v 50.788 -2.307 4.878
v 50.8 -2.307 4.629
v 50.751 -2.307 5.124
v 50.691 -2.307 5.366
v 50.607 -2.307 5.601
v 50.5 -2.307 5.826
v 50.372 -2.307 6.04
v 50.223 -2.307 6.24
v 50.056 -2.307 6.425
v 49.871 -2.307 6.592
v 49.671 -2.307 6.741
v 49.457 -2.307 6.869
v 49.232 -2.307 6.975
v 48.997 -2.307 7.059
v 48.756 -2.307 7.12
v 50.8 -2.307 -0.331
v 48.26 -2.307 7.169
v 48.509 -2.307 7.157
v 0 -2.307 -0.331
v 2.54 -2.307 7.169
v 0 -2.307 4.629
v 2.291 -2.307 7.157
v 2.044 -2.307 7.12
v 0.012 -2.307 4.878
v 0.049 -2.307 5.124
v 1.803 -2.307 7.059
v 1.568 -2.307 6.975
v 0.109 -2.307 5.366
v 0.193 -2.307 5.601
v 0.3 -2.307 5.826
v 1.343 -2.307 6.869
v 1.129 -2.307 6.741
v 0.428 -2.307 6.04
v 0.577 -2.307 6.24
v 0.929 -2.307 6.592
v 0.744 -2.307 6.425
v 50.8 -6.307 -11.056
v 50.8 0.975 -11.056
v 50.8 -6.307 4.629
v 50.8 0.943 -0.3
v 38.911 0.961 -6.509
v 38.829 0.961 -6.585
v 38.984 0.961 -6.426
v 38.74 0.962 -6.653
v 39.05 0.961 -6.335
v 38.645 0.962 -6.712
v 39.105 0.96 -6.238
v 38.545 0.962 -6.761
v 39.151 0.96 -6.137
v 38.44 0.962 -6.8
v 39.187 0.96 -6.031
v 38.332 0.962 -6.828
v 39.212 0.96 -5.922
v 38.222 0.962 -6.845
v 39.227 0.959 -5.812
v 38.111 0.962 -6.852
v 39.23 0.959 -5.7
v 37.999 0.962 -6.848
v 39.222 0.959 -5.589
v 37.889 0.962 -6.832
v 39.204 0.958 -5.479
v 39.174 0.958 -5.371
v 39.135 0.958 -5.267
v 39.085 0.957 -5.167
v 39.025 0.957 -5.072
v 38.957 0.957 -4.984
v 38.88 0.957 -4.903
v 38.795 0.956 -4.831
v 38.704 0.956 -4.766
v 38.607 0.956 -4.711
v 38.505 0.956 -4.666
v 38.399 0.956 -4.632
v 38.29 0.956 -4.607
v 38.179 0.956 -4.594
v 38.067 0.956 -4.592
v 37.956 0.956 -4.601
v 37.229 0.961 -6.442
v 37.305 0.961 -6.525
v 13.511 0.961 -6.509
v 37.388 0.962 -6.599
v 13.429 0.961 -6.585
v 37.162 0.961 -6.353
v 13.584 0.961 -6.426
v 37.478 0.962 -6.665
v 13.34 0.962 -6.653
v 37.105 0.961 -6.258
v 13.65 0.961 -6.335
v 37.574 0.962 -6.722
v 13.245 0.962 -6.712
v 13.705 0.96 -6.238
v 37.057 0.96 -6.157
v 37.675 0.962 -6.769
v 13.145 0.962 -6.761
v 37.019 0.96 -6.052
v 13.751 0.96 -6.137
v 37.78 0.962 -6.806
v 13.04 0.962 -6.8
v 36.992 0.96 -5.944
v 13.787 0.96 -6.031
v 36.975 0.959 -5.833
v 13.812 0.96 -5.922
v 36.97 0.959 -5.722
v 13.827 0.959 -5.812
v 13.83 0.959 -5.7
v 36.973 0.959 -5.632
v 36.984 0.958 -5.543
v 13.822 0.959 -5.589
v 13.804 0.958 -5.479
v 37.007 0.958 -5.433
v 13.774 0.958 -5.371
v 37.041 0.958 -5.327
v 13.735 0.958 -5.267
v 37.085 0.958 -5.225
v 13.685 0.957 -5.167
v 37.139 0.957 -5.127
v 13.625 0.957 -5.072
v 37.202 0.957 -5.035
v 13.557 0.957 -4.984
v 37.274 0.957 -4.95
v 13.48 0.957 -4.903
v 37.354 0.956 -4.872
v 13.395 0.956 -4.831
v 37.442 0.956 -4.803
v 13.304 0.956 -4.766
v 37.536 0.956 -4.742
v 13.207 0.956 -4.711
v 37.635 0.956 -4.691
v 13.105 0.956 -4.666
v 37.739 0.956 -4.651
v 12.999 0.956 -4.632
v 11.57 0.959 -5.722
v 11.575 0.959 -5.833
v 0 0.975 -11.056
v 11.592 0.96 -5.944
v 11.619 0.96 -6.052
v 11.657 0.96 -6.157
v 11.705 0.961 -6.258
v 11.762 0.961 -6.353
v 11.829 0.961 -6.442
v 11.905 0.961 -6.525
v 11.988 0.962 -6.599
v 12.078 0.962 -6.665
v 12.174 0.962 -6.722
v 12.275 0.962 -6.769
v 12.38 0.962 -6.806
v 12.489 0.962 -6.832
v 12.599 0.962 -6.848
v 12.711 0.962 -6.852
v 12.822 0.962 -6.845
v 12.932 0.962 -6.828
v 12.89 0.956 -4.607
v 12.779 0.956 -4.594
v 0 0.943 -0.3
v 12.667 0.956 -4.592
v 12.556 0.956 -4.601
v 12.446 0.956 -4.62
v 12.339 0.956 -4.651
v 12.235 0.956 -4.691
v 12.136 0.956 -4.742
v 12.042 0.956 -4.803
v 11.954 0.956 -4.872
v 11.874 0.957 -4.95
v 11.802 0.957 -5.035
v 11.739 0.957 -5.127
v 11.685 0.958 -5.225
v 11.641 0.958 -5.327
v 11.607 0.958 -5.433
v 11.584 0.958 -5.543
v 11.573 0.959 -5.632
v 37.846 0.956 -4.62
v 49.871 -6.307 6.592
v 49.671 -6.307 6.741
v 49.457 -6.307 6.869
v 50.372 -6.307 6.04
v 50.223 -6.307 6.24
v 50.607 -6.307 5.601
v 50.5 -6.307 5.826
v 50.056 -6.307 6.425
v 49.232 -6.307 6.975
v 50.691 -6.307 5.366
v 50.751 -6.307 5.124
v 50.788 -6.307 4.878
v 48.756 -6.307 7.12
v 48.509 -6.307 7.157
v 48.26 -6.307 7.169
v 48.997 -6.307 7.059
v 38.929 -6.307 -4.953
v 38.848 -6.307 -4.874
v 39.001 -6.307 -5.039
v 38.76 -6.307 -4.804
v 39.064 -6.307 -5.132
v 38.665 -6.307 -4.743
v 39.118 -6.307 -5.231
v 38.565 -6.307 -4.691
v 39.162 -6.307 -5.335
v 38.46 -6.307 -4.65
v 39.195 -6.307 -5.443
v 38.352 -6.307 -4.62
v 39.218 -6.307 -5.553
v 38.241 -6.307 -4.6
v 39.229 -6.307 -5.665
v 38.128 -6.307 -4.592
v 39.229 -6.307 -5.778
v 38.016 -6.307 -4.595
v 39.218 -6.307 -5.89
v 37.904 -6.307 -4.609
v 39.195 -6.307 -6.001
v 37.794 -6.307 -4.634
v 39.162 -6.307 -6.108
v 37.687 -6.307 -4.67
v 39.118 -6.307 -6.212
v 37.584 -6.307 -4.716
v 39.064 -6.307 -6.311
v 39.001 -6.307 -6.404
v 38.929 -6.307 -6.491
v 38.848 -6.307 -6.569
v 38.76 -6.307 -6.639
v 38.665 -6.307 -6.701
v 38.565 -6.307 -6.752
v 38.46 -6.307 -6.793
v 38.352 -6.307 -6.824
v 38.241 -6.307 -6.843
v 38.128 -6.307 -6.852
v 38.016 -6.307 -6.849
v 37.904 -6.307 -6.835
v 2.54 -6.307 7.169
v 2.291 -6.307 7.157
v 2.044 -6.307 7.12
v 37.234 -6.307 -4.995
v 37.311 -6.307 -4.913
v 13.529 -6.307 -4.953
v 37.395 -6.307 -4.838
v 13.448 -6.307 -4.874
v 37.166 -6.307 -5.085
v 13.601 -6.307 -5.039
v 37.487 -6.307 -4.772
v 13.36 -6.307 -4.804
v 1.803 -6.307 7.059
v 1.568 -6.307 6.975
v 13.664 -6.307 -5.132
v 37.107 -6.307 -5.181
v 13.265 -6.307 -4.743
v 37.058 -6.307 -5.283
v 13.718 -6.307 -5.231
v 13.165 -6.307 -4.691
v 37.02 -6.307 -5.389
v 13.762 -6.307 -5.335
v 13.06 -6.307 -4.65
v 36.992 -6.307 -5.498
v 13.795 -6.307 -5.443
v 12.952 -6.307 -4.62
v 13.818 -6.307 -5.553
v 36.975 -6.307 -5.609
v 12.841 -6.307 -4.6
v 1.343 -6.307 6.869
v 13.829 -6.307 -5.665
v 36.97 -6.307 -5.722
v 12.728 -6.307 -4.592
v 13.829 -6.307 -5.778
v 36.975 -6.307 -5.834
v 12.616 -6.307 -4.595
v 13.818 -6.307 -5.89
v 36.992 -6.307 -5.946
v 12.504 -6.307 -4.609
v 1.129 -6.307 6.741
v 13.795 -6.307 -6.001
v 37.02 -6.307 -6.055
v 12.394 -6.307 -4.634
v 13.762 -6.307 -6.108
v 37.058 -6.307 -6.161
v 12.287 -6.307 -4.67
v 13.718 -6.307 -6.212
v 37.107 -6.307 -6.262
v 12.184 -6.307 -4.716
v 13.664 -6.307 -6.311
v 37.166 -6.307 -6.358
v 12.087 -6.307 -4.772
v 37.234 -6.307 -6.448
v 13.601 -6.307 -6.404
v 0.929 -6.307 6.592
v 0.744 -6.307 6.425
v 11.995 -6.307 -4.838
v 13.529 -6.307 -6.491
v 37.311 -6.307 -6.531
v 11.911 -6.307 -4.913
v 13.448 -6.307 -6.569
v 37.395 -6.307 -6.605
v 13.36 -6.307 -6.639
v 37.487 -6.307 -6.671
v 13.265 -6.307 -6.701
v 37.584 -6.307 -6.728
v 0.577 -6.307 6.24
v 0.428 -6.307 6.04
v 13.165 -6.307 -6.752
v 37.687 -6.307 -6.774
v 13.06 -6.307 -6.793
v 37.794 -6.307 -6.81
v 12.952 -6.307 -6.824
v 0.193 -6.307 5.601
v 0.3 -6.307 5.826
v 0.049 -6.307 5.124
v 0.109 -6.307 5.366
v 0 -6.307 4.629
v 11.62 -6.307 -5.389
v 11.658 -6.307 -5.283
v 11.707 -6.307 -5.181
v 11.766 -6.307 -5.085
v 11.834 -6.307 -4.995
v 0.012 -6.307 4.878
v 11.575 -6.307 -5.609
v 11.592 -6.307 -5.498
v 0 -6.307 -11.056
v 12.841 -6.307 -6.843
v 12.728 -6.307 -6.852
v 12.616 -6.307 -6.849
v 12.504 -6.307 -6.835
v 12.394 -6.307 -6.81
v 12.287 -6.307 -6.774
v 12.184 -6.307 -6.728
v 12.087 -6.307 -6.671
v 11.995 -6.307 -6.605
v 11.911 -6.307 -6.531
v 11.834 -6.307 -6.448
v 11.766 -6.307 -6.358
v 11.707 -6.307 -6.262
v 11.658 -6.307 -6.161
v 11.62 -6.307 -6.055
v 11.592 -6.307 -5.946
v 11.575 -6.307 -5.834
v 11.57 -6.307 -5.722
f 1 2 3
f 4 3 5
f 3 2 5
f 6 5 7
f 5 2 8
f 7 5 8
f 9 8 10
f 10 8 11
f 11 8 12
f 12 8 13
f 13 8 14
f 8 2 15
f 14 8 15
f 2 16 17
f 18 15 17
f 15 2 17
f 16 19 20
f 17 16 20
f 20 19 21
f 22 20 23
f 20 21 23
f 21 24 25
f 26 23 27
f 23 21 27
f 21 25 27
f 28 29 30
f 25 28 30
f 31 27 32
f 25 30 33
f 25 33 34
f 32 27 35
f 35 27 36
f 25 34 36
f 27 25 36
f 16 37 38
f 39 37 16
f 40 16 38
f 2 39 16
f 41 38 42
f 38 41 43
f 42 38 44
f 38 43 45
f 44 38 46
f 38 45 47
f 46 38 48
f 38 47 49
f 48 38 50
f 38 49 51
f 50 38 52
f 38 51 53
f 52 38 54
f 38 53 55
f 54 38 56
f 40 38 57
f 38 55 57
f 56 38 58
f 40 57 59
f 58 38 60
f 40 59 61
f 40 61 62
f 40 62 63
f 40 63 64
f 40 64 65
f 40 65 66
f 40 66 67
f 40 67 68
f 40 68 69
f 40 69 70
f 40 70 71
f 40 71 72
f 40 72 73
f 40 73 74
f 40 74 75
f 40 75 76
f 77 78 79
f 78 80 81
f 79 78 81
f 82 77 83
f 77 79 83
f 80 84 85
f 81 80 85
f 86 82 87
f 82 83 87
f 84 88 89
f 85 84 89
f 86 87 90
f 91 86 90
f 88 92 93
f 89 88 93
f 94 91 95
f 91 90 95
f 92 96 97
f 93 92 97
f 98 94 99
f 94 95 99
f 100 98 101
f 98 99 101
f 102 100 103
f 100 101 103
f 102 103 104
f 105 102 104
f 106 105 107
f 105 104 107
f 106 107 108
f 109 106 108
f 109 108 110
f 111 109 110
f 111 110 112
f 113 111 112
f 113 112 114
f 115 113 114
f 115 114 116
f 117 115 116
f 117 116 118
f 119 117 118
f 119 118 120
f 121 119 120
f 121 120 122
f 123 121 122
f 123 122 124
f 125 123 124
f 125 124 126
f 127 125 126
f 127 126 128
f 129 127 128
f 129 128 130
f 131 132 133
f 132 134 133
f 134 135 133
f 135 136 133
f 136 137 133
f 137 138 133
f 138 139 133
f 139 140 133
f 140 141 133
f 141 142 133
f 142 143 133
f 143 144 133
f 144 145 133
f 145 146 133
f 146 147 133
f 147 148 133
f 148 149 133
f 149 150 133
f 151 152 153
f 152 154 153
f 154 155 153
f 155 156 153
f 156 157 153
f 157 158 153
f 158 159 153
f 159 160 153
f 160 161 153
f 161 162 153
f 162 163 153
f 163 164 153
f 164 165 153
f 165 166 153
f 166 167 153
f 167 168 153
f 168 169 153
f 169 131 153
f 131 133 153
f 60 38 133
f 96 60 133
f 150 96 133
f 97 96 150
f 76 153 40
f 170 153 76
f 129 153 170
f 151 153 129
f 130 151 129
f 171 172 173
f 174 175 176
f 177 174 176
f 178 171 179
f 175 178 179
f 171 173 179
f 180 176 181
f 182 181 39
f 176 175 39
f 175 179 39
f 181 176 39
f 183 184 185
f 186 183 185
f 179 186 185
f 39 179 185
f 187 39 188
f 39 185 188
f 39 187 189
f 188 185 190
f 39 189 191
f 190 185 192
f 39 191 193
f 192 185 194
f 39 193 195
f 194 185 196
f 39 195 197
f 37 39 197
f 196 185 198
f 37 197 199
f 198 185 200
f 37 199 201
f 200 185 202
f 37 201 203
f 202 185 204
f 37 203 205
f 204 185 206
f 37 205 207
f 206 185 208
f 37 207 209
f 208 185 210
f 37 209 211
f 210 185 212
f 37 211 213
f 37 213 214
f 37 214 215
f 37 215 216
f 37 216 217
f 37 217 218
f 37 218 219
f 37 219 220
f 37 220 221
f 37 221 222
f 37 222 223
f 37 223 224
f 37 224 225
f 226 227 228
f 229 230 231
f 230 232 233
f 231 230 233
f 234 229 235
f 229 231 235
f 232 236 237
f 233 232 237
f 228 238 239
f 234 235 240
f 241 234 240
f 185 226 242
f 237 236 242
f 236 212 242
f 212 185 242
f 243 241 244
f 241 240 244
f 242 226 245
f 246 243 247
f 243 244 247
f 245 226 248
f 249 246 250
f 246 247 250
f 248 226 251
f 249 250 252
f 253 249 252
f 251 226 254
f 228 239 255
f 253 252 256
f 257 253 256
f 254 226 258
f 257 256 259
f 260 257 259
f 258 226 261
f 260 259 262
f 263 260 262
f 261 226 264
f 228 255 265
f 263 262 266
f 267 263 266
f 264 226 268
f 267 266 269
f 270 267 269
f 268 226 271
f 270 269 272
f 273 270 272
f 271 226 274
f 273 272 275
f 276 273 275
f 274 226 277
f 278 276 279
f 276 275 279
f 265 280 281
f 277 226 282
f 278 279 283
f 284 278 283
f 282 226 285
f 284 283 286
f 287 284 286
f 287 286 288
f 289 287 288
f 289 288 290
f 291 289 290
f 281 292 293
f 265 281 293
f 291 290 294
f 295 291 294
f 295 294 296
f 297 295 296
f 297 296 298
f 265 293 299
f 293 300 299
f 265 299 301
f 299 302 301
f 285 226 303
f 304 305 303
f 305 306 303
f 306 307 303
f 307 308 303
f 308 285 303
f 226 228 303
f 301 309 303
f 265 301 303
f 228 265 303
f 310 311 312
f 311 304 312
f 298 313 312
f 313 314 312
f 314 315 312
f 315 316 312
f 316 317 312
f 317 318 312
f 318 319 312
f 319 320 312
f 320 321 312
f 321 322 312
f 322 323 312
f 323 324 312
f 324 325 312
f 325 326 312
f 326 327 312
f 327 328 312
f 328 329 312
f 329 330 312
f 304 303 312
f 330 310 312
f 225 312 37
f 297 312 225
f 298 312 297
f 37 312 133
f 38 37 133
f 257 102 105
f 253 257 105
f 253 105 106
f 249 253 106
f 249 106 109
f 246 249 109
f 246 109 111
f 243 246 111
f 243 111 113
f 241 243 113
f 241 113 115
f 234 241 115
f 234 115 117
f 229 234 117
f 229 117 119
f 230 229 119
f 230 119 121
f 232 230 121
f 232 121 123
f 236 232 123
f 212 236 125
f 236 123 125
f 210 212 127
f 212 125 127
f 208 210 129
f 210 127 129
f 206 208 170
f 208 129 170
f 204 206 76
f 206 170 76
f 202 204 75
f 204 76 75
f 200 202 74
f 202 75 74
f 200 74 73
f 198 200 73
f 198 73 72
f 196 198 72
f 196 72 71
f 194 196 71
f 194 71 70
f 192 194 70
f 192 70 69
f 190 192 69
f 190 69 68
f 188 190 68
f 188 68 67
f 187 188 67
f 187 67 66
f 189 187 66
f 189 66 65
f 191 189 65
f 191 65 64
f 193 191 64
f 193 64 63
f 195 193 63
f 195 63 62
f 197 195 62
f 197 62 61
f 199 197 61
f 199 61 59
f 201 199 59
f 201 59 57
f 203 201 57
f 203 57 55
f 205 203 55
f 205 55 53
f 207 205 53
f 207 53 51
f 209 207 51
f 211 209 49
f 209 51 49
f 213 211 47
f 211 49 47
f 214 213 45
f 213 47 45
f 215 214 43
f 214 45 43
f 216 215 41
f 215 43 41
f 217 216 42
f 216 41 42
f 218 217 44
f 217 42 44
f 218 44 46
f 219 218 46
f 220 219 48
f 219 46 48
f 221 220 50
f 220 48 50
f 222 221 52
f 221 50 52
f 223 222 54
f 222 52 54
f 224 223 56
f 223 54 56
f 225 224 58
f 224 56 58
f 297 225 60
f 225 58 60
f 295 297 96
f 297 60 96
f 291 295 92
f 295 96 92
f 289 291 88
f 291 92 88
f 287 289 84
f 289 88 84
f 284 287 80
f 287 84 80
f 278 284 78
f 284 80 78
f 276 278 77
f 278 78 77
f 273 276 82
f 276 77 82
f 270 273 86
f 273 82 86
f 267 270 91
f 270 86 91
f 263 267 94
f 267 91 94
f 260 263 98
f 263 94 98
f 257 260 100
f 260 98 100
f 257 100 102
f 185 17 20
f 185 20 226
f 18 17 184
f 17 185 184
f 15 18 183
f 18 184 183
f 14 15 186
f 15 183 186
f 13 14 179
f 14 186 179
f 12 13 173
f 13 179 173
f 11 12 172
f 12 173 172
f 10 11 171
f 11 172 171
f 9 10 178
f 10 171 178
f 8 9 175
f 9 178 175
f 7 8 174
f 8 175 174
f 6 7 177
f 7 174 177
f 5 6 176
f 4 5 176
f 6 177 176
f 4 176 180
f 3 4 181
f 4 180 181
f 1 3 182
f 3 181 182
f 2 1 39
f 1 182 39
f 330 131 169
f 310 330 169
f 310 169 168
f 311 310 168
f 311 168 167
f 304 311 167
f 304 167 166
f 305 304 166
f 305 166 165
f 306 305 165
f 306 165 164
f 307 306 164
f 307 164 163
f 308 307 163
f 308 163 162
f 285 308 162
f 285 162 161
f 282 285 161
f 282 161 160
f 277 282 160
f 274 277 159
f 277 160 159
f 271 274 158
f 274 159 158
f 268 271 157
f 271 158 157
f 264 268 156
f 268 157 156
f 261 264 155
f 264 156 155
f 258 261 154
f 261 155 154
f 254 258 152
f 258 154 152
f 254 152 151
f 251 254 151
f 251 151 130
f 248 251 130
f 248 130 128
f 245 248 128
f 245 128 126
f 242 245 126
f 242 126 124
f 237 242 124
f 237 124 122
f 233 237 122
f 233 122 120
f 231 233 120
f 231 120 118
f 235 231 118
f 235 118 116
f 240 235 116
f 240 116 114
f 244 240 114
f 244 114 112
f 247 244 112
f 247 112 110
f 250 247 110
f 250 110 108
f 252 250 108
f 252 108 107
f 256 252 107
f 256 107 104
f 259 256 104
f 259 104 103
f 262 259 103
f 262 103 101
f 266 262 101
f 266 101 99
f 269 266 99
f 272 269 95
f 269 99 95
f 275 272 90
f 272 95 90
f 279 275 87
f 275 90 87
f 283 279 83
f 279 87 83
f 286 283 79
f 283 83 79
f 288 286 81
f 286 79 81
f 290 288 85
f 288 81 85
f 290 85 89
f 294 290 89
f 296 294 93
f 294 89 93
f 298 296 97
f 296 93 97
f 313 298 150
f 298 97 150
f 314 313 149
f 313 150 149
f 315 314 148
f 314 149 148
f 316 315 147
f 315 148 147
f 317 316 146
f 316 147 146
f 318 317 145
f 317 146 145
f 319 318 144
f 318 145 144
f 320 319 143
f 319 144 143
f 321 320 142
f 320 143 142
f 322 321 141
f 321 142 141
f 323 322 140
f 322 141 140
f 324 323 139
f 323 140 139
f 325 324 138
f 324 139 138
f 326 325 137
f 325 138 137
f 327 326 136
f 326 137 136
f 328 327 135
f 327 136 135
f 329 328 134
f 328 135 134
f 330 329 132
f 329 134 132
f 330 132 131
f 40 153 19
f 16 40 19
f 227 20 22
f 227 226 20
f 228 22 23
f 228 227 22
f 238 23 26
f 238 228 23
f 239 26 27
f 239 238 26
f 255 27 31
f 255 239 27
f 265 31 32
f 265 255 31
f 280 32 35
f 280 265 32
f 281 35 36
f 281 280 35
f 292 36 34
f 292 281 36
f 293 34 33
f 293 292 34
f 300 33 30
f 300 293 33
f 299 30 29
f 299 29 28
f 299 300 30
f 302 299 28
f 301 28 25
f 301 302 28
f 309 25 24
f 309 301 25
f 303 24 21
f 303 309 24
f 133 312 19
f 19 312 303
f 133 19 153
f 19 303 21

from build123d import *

# Parameters (mm, degrees)
F1_DEPTH = 50.8
F3_D     = 2.2606
F4_R     = 2.54
F5_R     = 2.54


with BuildPart() as f1:
    # F0 (on Right) → F1 (new body)
    with BuildSketch(Plane.YZ):
        Polygon((-2.3067509514, -0.331221791), (-2.3067509514, 7.168778209), (-6.3067509514, 7.168778209), (-6.3067509514, -11.055721791), (0.9745705689, -11.055721791), (0.9431016669, -0.3002708691), align=None)
    extrude(amount=F1_DEPTH)

    # F3 (through all)
    with Locations(Plane.XZ.offset(6.3067509514)):
        with Locations((12.7, -5.721721791), (38.1, -5.721721791)):
            Hole(F3_D / 2)

    # F4
    f4_edges = [f1.edges().sort_by_distance(p)[0] for p in [
        (50.8, -4.306751, 7.168778),
    ]]
    fillet(f4_edges, radius=F4_R)

    # F5
    f5_edges = [f1.edges().sort_by_distance(p)[0] for p in [
        (0, -4.306751, 7.168778),
    ]]
    fillet(f5_edges, radius=F5_R)


solid = f1.part
